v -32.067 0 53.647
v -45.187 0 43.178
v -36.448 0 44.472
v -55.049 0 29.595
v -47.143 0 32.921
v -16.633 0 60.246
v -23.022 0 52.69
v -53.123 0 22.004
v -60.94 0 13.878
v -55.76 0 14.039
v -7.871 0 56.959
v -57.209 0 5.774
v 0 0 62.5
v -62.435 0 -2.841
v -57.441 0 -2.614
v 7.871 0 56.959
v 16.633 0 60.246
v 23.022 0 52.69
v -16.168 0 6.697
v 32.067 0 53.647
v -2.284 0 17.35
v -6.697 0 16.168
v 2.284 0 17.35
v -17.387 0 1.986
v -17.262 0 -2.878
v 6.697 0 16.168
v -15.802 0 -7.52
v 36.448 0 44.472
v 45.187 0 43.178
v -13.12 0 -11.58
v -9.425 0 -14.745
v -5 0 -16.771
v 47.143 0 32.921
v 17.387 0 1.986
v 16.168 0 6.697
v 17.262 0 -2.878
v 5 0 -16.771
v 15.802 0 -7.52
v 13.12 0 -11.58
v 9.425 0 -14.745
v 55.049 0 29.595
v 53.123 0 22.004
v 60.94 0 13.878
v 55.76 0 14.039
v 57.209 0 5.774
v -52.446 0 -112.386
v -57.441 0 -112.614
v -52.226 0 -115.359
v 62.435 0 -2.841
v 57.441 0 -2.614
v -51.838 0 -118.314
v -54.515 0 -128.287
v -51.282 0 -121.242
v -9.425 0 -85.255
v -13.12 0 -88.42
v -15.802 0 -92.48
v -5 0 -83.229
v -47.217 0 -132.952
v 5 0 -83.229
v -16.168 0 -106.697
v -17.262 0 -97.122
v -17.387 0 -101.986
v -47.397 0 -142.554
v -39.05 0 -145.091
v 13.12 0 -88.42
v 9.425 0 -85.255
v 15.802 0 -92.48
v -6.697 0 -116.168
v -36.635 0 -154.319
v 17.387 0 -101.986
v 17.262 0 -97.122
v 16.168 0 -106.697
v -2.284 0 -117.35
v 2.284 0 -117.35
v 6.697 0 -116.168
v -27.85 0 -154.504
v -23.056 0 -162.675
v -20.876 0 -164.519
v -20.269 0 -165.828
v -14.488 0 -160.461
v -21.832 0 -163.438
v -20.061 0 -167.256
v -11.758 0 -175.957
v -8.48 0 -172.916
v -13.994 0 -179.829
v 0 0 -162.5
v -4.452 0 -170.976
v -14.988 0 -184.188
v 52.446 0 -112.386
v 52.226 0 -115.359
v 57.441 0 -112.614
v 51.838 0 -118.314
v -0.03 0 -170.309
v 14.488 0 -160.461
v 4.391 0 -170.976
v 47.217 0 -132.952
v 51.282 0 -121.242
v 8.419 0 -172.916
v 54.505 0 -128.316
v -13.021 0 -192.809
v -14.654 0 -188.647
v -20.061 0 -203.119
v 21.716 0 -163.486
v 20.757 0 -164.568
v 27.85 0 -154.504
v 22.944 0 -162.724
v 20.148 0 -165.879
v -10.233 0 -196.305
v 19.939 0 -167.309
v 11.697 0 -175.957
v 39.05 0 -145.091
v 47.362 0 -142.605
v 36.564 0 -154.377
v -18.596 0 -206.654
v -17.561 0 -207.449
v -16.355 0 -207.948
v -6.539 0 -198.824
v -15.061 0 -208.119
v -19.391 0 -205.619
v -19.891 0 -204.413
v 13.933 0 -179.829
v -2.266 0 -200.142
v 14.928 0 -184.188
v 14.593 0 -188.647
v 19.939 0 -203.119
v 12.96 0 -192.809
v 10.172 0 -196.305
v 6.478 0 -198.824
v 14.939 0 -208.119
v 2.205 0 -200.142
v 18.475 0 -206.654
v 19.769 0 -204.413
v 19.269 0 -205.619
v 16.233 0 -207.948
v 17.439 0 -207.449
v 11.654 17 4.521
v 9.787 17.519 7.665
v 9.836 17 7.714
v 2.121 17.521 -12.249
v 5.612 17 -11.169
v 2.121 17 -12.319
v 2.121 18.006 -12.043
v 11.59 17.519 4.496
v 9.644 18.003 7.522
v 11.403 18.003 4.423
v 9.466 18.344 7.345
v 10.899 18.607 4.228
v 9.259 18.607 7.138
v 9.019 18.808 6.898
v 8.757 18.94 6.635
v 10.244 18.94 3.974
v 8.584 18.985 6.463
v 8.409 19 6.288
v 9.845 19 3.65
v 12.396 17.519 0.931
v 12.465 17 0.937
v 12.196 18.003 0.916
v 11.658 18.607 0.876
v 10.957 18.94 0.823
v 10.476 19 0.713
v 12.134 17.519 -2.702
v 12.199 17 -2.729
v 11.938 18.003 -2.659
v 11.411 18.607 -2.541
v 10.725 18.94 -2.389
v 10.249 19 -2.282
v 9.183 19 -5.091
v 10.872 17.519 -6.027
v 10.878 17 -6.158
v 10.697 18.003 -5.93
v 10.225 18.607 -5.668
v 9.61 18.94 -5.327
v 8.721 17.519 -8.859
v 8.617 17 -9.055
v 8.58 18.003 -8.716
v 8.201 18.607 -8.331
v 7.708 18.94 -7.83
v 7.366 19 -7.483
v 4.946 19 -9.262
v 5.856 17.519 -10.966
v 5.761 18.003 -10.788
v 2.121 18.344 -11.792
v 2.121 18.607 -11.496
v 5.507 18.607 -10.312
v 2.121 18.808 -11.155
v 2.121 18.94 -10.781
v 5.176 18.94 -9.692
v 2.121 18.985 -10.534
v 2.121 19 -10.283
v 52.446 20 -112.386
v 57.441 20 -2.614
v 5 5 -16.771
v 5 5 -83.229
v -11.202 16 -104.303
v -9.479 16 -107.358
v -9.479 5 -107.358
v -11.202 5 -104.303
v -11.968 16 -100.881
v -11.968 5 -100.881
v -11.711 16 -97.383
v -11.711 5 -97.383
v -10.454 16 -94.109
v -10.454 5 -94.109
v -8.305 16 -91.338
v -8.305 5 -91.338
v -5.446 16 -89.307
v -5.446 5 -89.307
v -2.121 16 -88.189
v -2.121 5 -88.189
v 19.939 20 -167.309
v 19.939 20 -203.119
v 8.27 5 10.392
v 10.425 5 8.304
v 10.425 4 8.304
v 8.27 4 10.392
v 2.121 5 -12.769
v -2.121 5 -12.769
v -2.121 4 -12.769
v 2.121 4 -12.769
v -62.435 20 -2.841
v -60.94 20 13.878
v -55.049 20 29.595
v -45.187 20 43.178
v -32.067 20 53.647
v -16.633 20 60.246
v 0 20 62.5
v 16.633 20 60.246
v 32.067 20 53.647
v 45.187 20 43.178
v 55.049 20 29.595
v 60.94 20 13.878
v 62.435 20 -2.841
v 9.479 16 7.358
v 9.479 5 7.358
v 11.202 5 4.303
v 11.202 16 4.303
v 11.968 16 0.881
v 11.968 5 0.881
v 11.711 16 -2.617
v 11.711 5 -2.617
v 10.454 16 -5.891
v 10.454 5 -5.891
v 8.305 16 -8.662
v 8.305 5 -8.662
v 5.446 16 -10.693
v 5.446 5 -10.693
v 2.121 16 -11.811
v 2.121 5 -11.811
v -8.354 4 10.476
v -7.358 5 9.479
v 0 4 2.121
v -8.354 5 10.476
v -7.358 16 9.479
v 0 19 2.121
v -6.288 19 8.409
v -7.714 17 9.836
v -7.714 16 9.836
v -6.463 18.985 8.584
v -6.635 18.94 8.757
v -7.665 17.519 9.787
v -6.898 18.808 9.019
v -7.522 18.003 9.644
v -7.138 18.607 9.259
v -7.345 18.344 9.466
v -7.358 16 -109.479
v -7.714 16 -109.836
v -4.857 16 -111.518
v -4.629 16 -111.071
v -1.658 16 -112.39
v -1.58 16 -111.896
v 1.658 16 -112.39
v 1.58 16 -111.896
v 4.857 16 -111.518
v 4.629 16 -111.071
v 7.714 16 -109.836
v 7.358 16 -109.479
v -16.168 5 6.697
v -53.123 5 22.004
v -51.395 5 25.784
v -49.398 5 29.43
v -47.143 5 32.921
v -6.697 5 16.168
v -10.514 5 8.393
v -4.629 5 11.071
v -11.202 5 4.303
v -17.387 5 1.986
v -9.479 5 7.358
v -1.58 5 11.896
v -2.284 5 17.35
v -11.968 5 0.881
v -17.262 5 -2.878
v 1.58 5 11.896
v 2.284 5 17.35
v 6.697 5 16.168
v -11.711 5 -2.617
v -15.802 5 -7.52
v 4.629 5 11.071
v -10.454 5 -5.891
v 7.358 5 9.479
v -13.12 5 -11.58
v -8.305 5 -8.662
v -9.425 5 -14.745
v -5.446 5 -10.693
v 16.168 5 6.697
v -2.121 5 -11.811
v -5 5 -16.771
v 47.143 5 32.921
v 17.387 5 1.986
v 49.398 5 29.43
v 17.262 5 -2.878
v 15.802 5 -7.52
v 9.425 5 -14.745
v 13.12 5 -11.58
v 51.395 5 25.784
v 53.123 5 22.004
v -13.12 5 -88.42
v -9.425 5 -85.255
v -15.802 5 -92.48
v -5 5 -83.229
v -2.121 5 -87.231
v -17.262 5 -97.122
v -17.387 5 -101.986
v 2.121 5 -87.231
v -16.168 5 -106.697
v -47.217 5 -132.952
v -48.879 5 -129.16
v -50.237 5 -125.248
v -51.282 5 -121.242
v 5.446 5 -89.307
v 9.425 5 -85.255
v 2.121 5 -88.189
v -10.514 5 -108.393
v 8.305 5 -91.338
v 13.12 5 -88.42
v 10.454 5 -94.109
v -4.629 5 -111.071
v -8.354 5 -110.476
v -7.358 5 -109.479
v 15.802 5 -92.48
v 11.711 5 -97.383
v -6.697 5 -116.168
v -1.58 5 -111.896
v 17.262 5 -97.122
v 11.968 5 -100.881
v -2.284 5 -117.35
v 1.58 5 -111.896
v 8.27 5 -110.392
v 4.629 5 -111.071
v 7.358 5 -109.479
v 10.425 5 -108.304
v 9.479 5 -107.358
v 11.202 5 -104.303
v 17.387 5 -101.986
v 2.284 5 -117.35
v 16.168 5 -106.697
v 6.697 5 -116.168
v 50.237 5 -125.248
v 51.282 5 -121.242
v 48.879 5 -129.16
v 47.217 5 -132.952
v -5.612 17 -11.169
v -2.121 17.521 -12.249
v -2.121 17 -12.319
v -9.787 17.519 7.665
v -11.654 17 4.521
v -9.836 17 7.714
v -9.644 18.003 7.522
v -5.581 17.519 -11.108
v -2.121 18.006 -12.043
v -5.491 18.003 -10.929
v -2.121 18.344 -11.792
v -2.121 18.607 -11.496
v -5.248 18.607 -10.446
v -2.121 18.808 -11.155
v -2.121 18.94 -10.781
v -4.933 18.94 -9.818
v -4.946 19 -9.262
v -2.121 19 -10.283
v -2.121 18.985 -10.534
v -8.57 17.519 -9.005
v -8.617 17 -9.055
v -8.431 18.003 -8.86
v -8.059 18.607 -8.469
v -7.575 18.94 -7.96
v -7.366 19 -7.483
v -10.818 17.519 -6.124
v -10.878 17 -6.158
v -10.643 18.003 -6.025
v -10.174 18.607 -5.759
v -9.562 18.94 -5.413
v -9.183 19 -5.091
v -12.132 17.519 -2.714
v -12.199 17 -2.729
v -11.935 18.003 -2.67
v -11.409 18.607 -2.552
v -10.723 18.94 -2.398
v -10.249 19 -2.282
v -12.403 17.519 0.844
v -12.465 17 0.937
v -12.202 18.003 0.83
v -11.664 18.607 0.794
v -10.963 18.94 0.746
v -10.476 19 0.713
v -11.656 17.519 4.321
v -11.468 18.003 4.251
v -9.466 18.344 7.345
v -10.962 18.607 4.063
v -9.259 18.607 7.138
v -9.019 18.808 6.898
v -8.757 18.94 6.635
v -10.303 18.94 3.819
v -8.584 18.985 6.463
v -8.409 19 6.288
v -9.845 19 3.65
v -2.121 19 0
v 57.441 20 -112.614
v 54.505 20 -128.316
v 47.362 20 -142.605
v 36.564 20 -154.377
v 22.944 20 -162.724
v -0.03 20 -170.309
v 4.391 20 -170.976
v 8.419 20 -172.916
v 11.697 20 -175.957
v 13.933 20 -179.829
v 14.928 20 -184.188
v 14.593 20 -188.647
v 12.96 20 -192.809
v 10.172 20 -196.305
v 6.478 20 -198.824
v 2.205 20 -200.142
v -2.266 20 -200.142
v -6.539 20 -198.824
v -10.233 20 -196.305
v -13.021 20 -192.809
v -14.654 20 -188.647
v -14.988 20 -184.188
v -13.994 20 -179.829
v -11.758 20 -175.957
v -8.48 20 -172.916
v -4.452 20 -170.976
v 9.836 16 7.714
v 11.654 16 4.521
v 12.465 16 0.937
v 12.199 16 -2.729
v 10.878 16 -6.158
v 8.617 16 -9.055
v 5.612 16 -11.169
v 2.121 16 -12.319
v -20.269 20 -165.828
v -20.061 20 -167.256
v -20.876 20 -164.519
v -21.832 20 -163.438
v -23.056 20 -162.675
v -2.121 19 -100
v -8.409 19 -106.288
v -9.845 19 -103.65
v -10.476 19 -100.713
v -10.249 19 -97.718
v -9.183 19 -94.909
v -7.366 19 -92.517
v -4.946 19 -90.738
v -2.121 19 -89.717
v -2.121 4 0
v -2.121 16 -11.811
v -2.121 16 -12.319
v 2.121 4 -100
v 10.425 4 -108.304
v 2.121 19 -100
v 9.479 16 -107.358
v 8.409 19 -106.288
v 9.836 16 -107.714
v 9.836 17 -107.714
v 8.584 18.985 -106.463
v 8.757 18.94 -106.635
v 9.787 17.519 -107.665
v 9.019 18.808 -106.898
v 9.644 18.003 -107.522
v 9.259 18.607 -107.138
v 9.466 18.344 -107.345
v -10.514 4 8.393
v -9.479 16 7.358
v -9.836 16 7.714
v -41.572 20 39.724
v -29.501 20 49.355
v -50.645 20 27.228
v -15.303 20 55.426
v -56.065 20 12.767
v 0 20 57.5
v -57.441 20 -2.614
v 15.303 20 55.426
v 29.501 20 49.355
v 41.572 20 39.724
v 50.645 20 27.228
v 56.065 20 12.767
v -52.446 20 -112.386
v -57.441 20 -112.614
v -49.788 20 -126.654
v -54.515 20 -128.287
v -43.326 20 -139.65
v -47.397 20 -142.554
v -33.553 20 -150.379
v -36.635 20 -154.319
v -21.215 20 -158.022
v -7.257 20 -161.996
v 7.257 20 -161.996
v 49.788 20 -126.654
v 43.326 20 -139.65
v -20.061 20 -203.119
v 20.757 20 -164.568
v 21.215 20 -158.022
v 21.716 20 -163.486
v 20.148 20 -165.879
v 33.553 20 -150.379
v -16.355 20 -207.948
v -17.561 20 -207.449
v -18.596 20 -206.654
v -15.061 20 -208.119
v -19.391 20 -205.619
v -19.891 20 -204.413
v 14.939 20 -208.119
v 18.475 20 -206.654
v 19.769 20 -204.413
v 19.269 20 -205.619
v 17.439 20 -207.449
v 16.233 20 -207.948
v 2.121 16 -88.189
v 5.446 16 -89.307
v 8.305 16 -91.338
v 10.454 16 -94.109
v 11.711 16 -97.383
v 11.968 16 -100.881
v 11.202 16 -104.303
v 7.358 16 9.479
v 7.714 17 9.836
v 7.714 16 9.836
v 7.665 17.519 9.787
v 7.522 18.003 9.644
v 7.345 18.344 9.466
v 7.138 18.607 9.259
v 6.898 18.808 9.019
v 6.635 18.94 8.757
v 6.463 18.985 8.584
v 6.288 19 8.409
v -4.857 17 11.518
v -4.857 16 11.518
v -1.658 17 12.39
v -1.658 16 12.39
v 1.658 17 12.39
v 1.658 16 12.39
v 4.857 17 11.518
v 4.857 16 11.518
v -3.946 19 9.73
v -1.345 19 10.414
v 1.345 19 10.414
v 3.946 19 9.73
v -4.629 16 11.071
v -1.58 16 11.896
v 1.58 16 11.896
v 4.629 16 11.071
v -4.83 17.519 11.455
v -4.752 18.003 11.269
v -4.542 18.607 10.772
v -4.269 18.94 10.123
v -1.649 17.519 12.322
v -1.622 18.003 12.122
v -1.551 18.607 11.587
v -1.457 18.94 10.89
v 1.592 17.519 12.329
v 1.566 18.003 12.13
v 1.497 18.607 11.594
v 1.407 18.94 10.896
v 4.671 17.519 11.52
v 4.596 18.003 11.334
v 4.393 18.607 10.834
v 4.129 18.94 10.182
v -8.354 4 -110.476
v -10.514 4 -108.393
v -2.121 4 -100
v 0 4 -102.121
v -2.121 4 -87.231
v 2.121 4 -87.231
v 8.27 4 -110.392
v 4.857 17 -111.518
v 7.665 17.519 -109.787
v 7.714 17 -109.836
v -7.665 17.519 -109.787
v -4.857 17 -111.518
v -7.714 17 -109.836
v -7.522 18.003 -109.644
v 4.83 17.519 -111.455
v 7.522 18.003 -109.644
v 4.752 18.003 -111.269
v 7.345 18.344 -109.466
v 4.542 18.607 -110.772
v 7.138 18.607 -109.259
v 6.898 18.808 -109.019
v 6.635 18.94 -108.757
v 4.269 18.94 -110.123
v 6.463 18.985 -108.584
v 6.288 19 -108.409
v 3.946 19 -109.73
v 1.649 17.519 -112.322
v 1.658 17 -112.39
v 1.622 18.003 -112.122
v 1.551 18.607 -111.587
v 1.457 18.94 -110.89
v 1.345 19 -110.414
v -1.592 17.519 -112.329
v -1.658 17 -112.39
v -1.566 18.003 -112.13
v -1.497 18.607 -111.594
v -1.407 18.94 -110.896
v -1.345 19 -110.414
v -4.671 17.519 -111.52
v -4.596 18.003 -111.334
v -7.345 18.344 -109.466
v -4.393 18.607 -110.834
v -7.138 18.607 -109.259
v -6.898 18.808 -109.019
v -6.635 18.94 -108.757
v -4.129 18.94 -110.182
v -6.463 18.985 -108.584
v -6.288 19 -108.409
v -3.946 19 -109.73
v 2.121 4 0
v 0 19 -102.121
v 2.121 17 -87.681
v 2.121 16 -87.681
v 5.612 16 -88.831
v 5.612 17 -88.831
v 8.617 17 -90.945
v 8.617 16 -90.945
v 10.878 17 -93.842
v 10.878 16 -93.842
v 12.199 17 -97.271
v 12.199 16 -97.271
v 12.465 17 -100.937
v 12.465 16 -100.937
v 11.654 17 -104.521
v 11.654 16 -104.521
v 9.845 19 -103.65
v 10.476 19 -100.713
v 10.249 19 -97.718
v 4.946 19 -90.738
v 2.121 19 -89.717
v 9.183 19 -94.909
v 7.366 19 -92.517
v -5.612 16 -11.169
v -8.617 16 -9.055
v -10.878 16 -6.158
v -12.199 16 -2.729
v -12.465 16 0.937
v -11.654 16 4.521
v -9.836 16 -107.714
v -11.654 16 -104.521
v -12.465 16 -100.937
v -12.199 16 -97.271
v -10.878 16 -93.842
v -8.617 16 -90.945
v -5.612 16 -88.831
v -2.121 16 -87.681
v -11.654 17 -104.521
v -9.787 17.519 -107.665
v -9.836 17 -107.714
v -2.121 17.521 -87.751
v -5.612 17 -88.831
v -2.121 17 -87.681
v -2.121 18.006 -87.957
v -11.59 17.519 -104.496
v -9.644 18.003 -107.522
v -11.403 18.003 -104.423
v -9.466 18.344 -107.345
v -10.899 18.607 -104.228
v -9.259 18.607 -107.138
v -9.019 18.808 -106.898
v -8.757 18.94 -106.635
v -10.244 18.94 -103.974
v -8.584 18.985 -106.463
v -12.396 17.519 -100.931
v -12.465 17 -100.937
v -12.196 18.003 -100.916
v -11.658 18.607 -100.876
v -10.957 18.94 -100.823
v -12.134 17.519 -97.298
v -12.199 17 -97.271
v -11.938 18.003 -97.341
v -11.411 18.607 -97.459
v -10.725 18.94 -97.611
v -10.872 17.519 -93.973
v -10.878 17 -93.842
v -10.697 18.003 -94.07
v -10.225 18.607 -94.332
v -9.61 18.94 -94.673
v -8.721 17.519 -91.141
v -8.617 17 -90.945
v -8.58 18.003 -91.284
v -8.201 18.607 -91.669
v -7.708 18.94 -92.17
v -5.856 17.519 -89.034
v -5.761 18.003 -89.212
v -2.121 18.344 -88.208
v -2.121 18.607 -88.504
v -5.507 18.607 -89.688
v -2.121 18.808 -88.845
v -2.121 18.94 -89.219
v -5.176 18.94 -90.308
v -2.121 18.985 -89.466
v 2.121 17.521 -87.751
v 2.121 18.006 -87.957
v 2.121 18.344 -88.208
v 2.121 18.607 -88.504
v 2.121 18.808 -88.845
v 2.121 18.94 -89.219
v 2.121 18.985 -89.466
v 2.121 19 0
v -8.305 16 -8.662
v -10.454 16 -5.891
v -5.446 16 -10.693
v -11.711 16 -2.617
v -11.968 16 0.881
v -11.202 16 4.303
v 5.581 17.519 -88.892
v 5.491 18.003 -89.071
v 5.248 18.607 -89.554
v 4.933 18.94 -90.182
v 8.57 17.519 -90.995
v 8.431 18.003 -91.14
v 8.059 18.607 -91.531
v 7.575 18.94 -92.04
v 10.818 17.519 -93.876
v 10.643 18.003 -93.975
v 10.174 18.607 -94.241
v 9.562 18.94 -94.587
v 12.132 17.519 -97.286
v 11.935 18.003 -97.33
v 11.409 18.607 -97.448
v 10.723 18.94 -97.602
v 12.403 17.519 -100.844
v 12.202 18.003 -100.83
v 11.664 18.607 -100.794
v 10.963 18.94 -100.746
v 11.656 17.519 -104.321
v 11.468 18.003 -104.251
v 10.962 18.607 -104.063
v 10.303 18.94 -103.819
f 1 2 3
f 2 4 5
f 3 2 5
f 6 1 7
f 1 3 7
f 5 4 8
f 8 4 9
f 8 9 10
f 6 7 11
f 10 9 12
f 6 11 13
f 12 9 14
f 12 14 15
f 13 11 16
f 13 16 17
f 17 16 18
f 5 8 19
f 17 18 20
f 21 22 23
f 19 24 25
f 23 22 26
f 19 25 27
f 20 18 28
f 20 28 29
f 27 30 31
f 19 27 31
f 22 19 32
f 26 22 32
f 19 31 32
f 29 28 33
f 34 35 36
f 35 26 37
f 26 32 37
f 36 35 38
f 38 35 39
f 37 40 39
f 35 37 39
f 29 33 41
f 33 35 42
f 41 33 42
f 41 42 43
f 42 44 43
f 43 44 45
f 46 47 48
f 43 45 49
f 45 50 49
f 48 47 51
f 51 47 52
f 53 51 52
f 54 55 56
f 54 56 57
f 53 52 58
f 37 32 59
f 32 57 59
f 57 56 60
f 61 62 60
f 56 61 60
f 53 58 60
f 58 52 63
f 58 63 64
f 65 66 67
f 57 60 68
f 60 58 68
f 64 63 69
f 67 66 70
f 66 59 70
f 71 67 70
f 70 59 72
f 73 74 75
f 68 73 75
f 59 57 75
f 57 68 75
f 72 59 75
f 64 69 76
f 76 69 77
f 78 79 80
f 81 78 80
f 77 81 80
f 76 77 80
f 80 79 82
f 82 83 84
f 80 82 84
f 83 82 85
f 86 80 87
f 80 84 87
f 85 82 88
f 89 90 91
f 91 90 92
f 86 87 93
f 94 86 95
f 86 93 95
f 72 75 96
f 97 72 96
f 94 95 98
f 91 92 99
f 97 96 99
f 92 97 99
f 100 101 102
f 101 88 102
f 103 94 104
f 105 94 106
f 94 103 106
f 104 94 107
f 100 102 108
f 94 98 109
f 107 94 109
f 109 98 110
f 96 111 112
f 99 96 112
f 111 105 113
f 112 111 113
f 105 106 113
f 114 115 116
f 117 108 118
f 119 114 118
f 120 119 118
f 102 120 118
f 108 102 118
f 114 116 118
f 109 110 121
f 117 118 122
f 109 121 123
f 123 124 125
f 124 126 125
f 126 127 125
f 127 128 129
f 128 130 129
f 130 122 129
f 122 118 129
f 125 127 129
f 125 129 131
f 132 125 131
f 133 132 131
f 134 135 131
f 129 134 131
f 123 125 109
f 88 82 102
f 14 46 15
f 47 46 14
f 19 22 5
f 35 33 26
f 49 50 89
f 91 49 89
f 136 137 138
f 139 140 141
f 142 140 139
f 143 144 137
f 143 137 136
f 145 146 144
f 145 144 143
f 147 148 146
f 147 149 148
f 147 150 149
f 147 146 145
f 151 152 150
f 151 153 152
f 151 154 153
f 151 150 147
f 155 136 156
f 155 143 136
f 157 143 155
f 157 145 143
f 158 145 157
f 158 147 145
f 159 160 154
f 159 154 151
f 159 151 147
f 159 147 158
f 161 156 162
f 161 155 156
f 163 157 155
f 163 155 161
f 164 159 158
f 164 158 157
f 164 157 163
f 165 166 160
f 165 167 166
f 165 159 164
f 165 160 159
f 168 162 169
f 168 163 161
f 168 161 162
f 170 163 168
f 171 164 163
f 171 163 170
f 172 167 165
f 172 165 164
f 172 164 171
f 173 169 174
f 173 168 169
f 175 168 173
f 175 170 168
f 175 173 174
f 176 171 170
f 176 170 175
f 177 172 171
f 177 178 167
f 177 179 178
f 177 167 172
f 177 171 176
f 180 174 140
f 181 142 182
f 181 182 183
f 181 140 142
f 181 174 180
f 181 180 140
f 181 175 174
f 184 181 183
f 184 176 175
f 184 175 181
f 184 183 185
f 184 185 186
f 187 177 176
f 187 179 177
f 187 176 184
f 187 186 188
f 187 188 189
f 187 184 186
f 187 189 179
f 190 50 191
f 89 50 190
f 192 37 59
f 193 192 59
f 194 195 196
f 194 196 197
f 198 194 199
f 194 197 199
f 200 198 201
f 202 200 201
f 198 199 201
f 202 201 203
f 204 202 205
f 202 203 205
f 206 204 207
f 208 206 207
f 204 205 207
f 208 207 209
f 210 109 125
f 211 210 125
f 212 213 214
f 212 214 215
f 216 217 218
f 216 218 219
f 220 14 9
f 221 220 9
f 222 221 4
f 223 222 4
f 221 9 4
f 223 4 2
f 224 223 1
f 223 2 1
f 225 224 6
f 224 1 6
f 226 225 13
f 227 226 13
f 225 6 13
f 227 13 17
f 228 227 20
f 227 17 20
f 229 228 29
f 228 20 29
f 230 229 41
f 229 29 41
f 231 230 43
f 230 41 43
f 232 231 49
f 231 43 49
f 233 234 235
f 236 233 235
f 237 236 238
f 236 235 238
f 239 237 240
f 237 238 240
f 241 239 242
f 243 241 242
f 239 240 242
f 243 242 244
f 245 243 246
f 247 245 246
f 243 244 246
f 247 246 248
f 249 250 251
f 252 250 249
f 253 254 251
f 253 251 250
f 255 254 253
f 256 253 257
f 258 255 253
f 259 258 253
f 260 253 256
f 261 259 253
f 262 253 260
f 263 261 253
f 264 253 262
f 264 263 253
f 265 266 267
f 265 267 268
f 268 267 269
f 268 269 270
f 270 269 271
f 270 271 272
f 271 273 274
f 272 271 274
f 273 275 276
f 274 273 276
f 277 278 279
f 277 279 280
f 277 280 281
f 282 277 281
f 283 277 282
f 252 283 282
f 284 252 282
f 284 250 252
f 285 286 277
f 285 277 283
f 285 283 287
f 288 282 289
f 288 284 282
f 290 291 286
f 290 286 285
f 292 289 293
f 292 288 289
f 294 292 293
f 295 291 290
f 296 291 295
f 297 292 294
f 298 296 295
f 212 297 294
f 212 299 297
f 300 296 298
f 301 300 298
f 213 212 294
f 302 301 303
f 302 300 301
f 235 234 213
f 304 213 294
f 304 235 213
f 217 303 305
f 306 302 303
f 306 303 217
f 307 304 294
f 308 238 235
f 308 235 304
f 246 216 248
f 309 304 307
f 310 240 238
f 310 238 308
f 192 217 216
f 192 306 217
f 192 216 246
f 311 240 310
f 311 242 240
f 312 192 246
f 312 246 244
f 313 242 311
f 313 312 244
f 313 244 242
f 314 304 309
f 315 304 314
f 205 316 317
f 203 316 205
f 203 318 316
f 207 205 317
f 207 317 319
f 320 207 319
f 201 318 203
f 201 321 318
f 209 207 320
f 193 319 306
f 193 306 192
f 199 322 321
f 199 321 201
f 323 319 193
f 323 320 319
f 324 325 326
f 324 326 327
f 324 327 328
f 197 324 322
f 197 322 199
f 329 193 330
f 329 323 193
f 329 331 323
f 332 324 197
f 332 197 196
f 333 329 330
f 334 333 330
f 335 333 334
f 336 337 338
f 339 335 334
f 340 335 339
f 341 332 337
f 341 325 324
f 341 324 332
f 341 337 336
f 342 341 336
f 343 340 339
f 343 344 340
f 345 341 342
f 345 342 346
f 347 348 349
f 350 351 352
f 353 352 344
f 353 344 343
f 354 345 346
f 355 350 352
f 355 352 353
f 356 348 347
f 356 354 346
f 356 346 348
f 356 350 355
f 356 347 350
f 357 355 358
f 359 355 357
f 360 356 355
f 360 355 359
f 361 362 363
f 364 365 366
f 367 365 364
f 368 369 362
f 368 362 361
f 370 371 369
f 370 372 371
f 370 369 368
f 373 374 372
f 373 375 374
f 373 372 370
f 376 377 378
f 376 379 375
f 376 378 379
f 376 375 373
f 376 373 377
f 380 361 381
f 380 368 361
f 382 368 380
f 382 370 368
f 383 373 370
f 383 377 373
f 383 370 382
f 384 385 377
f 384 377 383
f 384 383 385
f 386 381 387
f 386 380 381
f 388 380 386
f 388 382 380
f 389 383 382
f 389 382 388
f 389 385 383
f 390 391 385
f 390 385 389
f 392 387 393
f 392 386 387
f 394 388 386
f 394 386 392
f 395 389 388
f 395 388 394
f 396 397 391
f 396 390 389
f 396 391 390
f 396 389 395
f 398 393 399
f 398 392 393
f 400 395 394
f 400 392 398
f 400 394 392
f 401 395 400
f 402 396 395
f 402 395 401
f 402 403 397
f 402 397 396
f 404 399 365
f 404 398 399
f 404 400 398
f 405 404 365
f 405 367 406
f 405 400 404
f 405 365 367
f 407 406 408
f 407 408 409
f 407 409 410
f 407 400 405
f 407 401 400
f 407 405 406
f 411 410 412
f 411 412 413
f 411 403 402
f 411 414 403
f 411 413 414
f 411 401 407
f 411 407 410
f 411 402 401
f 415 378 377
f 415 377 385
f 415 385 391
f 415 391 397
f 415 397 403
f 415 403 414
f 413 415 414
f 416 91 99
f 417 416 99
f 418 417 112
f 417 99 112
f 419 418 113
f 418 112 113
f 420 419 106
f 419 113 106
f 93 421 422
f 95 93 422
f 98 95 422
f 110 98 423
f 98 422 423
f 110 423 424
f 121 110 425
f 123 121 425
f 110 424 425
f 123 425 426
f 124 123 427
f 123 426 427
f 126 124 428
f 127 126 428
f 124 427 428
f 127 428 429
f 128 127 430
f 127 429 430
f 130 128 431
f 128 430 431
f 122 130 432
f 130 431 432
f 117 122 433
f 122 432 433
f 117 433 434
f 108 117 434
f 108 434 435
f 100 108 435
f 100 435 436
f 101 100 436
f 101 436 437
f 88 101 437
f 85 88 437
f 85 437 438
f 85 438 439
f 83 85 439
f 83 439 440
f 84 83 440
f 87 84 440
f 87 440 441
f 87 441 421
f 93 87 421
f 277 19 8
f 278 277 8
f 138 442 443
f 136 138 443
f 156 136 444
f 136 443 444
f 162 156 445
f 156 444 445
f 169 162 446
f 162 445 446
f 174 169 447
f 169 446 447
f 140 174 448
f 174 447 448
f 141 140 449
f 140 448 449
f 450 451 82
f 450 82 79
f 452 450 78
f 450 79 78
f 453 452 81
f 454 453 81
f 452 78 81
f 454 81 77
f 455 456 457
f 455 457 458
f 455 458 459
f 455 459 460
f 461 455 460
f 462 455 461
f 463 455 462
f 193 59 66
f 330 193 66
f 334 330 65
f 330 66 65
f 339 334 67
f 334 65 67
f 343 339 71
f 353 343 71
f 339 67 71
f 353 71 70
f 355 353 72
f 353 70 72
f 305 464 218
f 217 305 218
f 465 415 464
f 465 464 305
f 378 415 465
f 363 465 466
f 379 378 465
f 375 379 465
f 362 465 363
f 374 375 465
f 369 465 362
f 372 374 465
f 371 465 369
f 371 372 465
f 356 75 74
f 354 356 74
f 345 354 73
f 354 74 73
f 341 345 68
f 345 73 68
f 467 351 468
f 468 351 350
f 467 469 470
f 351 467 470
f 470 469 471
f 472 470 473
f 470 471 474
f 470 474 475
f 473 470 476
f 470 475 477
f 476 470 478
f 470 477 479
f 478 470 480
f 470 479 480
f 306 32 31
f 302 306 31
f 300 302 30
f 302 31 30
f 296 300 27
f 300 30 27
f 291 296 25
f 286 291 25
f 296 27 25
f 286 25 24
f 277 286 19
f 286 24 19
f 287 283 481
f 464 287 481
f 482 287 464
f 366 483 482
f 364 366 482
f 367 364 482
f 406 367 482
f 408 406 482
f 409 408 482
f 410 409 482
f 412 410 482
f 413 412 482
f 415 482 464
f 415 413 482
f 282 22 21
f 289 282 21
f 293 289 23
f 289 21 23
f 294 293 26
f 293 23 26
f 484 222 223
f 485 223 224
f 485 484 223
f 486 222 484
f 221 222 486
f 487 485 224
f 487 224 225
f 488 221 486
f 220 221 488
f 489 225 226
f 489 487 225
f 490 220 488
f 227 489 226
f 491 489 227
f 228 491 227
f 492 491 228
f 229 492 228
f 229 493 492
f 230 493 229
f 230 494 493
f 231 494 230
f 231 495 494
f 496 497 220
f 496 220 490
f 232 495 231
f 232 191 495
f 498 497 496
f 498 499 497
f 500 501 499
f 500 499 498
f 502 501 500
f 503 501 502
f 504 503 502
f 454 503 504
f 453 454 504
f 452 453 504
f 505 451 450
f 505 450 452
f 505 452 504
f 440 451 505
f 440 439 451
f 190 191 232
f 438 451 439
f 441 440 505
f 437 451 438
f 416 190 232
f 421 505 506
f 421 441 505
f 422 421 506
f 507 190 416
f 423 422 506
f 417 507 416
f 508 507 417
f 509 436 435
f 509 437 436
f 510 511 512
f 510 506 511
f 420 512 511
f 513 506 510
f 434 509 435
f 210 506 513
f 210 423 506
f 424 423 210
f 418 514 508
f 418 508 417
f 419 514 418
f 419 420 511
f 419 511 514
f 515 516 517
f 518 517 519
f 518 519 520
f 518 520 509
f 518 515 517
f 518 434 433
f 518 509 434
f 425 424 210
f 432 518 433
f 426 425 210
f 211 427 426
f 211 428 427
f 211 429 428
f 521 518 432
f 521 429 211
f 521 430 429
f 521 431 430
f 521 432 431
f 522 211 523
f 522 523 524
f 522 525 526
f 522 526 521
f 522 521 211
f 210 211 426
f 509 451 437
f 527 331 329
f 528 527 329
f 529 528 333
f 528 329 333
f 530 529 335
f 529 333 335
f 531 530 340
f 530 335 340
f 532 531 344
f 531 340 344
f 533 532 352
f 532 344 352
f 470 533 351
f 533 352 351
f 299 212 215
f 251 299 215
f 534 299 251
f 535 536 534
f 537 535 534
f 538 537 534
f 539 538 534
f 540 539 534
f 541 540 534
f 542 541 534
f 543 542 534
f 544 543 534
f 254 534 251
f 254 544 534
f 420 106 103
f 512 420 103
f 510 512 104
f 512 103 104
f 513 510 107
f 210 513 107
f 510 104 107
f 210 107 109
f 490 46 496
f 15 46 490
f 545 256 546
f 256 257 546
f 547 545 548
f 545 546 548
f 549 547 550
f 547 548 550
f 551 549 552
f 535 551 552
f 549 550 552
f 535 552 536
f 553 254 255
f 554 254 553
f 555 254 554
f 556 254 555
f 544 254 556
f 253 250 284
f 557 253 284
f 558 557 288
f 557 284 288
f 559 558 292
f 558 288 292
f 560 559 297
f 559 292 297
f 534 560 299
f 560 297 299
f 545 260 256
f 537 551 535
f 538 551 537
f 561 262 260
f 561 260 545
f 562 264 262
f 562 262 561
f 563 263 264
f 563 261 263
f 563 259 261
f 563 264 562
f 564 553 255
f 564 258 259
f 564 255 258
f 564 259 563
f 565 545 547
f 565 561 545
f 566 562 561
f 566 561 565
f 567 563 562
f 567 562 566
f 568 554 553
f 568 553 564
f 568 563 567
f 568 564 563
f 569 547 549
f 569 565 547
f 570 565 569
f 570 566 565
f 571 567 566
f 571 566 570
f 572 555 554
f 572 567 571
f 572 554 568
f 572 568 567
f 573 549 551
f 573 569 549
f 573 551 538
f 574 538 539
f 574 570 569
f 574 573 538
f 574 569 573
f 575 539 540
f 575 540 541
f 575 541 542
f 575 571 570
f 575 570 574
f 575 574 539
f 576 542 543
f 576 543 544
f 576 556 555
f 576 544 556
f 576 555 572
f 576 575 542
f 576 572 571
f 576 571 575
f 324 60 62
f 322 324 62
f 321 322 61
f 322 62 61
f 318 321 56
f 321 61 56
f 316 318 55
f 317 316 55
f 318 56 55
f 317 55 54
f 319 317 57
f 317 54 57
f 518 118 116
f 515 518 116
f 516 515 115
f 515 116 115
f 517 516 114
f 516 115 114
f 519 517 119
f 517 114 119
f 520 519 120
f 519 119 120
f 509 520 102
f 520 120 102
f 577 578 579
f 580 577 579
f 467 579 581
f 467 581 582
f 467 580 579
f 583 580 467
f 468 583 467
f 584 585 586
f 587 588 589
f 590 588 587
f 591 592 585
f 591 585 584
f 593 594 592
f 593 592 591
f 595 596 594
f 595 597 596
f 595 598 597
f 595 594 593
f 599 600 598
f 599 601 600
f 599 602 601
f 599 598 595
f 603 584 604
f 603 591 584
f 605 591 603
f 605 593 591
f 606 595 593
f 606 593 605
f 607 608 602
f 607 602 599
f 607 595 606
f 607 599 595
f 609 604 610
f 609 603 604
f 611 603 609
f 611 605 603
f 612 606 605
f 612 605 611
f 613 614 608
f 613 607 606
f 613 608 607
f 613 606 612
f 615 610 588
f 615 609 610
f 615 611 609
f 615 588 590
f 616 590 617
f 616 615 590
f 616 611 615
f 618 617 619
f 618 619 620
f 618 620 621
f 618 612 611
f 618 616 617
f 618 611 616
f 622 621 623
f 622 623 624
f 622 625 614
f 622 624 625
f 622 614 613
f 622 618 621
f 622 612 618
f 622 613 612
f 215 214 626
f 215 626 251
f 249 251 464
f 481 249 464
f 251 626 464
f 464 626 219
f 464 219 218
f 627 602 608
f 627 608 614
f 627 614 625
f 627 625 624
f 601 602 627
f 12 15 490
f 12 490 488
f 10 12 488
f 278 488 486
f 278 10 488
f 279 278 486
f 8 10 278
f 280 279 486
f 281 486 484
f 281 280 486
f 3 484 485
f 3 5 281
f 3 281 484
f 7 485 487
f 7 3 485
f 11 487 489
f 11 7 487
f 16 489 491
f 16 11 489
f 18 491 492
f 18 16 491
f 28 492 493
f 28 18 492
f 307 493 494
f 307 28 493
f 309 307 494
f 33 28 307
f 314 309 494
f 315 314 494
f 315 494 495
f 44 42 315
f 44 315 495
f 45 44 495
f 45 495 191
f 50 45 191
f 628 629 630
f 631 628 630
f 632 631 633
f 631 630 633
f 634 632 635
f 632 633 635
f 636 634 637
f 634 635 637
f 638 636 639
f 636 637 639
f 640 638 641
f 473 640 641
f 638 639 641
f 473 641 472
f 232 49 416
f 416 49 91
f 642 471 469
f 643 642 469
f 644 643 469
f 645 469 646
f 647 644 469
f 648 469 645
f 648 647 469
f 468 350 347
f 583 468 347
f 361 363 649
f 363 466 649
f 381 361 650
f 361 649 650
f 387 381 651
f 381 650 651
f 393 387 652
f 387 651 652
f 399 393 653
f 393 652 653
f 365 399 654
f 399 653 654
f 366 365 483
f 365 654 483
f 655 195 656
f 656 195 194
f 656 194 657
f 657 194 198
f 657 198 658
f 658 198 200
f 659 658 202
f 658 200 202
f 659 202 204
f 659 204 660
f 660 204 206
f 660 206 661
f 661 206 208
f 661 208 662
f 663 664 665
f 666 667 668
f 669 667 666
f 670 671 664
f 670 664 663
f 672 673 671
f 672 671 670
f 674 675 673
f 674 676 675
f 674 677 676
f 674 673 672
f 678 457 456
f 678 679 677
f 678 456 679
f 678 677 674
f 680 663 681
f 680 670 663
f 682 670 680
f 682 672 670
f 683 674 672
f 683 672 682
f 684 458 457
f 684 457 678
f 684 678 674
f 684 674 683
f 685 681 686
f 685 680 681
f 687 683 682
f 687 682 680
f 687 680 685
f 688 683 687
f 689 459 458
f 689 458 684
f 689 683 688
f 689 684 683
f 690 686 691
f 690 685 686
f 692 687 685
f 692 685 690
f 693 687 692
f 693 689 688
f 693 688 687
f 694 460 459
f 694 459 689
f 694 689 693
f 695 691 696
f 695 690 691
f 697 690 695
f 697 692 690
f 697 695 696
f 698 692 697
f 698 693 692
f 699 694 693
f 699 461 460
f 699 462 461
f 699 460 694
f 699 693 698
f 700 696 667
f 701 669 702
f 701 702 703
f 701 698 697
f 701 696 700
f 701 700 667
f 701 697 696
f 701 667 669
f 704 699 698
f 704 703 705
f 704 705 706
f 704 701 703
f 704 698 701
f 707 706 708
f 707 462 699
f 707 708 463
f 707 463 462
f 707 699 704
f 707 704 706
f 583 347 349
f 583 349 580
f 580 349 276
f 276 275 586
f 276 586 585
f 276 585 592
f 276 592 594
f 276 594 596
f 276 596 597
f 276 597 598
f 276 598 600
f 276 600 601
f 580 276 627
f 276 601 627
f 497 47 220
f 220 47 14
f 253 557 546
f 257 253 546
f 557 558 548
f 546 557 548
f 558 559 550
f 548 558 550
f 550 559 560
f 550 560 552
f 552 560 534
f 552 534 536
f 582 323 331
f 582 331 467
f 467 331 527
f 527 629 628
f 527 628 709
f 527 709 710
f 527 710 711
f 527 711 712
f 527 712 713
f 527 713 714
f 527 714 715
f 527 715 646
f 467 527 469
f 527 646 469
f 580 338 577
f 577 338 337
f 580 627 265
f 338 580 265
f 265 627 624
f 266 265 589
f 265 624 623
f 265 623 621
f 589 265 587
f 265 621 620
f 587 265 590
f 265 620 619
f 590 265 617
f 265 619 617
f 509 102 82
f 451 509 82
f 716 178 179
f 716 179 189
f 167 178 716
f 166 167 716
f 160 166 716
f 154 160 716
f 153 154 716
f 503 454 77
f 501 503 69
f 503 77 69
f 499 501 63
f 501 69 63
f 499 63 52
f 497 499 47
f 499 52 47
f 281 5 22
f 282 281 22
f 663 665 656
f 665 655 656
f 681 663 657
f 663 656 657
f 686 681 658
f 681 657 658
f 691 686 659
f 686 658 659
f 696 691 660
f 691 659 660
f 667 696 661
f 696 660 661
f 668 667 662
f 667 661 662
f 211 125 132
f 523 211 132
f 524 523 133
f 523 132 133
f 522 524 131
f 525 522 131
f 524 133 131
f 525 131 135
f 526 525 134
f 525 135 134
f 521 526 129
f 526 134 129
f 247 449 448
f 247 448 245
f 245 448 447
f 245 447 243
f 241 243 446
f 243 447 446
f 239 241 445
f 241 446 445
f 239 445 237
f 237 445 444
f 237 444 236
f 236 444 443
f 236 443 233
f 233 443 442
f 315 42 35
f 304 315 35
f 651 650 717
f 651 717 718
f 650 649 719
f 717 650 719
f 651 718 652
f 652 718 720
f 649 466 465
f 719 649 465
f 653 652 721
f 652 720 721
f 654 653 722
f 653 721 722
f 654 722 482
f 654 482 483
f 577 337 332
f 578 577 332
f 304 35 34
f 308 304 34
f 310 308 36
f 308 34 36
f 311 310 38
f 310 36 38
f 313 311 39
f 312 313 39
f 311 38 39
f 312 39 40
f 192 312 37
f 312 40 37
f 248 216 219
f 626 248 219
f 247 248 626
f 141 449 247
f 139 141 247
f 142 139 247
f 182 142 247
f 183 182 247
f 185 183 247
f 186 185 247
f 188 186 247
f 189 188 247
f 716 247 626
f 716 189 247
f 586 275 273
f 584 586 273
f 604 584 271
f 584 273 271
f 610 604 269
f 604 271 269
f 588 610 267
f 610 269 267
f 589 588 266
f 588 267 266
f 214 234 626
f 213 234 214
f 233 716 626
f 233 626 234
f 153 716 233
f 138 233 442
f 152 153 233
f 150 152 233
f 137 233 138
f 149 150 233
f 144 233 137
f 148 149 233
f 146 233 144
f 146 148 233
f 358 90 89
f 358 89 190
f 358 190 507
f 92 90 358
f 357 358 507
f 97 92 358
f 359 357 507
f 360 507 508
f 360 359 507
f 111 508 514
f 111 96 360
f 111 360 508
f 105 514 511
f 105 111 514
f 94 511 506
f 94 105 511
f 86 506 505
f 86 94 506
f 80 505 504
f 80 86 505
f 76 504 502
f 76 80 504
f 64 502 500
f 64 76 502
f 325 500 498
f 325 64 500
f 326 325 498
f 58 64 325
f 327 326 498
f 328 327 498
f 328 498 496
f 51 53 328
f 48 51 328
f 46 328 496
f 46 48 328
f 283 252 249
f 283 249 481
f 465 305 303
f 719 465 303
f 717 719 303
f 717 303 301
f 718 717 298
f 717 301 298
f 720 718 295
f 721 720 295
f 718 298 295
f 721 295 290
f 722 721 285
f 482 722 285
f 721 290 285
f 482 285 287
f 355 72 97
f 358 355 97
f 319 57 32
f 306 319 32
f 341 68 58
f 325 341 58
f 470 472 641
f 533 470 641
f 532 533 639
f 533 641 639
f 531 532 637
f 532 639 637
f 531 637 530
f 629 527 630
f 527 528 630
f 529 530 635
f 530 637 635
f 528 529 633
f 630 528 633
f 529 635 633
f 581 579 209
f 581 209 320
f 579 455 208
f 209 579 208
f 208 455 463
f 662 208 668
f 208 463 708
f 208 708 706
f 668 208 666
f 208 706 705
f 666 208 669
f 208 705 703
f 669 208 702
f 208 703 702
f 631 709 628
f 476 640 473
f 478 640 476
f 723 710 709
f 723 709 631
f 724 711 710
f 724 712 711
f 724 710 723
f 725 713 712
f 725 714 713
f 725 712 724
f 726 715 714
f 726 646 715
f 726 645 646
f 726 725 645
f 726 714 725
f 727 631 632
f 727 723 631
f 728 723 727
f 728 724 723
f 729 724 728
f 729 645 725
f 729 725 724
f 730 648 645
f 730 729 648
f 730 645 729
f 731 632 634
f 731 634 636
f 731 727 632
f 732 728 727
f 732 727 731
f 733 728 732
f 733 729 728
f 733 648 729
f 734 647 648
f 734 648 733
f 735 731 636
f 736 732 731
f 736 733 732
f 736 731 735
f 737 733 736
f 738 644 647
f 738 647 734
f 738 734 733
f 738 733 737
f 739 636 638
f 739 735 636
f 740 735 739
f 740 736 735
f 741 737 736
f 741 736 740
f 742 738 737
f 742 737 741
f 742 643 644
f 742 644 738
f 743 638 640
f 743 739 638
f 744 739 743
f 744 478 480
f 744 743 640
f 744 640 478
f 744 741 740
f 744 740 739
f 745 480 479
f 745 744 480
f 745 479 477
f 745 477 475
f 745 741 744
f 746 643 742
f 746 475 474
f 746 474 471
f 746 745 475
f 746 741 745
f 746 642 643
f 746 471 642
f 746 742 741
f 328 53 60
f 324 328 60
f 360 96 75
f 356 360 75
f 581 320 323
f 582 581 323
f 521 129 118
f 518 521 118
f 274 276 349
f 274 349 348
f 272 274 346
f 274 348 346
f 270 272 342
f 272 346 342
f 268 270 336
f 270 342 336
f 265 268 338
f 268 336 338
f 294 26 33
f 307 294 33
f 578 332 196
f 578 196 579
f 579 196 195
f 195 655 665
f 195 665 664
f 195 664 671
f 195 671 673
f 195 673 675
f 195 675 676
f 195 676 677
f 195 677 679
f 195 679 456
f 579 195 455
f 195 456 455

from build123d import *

# Parameters (mm, degrees)
SALIENTE_EXTRUIR1_DEPTH = 20
SALIENTE_EXTRUIR2_DEPTH = 5
SKETCH1_R               = 12
BOSS_EXTRUDE1_DEPTH     = 11
SKETCH2_R               = 12.5
BOSS_EXTRUDE2_DEPTH     = 3
FILLET1_R               = 2
CUT_EXTRUDE2_DEPTH      = 15
SKETCH7_R               = 15
CUT_EXTRUDE3_DEPTH      = 28


with BuildPart() as part:
    # Croquis1 → Saliente-Extruir1 (new body)
    with BuildSketch(Plane(origin=(0, 0, 0), x_dir=(1, 0, 0), z_dir=(0, 1, 0))):
        with BuildLine():
            Line((-57.44056846, 112.613636364), (-62.4354005, 2.840909091))
            ThreePointArc((-62.4354005, 2.840909091), (0, -62.5), (62.4354005, 2.840909091))
            Line((62.4354005, 2.840909091), (57.44056846, 112.613636364))
            ThreePointArc((57.44056846, 112.613636364), (47.362244362, 142.604720655), (22.943989921, 162.724029877))
            ThreePointArc((22.943989921, 162.724029877), (20.757274923, 164.567893199), (19.93911948, 167.308728127))
            Line((19.93911948, 167.308728127), (19.93911948, 203.118676651))
            ThreePointArc((19.93911948, 203.118676651), (18.474653385, 206.654210557), (14.93911948, 208.118676651))
            Line((14.93911948, 208.118676651), (-15.06088052, 208.118676651))
            ThreePointArc((-15.06088052, 208.118676651), (-18.596414426, 206.654210557), (-20.06088052, 203.118676651))
            Line((-20.06088052, 203.118676651), (-20.06088052, 167.255587217))
            ThreePointArc((-20.06088052, 167.255587217), (-20.876125318, 164.519198375), (-23.056010079, 162.675140239))
            ThreePointArc((-23.056010079, 162.675140239), (-47.396870484, 142.554364812), (-57.44056846, 112.613636364))
        make_face()
        with BuildLine():
            Line((-52.44573642, 112.386363636), (-57.44056846, 2.613636364))
            ThreePointArc((-57.44056846, 2.613636364), (0, -57.5), (57.44056846, 2.613636364))
            Line((57.44056846, 2.613636364), (52.44573642, 112.386363636))
            ThreePointArc((52.44573642, 112.386363636), (0, 162.5), (-52.44573642, 112.386363636))
        make_face(mode=Mode.SUBTRACT)
    extrude(amount=SALIENTE_EXTRUIR1_DEPTH)



with BuildPart() as body_2:
    # Croquis2 → Saliente-Extruir2 (new body)
    with BuildSketch(Plane(origin=(0, 0, 0), x_dir=(-1, 0, 0), z_dir=(0, -1, 0))):
        with BuildLine():
            Line((5, 83.229490169), (5, 16.770509831))
            ThreePointArc((5, 16.770509831), (15.80191276, 7.519943692), (16.167891819, -6.696960066))
            Line((16.167891819, -6.696960066), (53.123073119, -22.004297361))
            ThreePointArc((53.123073119, -22.004297361), (50.429243253, -27.625014479), (47.142858448, -32.921131471))
            Line((47.142858448, -32.921131471), (6.696960066, -16.167891819))
            ThreePointArc((6.696960066, -16.167891819), (0, -17.5), (-6.696960066, -16.167891819))
            Line((-6.696960066, -16.167891819), (-47.142858448, -32.921131471))
            ThreePointArc((-47.142858448, -32.921131471), (-50.429243253, -27.625014479), (-53.123073119, -22.004297361))
            Line((-53.123073119, -22.004297361), (-16.167891819, -6.696960066))
            ThreePointArc((-16.167891819, -6.696960066), (-15.80191276, 7.519943692), (-5, 16.770509831))
            Line((-5, 16.770509831), (-5, 83.229490169))
            ThreePointArc((-5, 83.229490169), (-15.80191276, 92.480056308), (-16.167891819, 106.696960066))
            Line((-16.167891819, 106.696960066), (-51.282274043, 121.241813418))
            ThreePointArc((-51.282274043, 121.241813418), (-49.596532898, 127.217256589), (-47.217157465, 132.951907131))
            Line((-47.217157465, 132.951907131), (-6.696960066, 116.167891819))
            ThreePointArc((-6.696960066, 116.167891819), (0, 117.5), (6.696960066, 116.167891819))
            Line((6.696960066, 116.167891819), (47.217157465, 132.951907131))
            ThreePointArc((47.217157465, 132.951907131), (49.596532898, 127.217256589), (51.282274043, 121.241813418))
            Line((51.282274043, 121.241813418), (16.167891819, 106.696960066))
            ThreePointArc((16.167891819, 106.696960066), (15.80191276, 92.480056308), (5, 83.229490169))
        make_face()
    extrude(amount=-SALIENTE_EXTRUIR2_DEPTH)


with BuildPart() as part_1:
    add(part.part)

    add(body_2.part)  # Boss-Extrude1 merges body 2
    # Sketch1 → Boss-Extrude1 (add)
    with BuildSketch(Plane(origin=(0, 5, 0), x_dir=(1, 0, 0), z_dir=(0, 1, 0))):
        with Locations(Location((0, 100, 0), (0, 0, 90))):
            Circle(SKETCH1_R)
        with Locations(Location((0, 0, 0), (0, 0, 90))):
            Circle(SKETCH1_R)
    extrude(amount=BOSS_EXTRUDE1_DEPTH)

    # Sketch2 → Boss-Extrude2 (add)
    with BuildSketch(Plane(origin=(0, 16, 0), x_dir=(1, 0, 0), z_dir=(0, 1, 0))):
        with Locations(Location((0, 100, 0), (0, 0, 270))):
            Circle(SKETCH2_R)
        with Locations(Location((0, 0, 0), (0, 0, 270))):
            Circle(SKETCH2_R)
    extrude(amount=BOSS_EXTRUDE2_DEPTH)

    # Fillet1
    fillet1_edges = [part_1.edges().sort_by_distance(p)[0] for p in [
        (0, 19, -112.5),
        (0, 19, -12.5),
    ]]
    fillet(fillet1_edges, radius=FILLET1_R)

    # Sketch6 → Cut-Extrude2 (cut)
    with BuildSketch(Plane(origin=(0, 19, 0), x_dir=(1, 0, 0), z_dir=(0, 1, 0))):
        Polygon((-10.514481664, 108.393161321), (-2.121320344, 100), (-2.121320344, 87.230677616), (2.121320344, 87.230677616), (2.121320344, 100), (10.425393612, 108.304073268), (8.270497601, 110.391817945), (0, 102.121320344), (-8.354488758, 110.475809101), align=None)
        Polygon((-2.121320344, 12.769322384), (2.121320344, 12.769322384), (2.121320344, 0), (10.425393612, -8.304073268), (8.270497601, -10.391817945), (0, -2.121320344), (-8.354488758, -10.475809101), (-10.514481664, -8.393161321), (-2.121320344, 0), align=None)
    extrude(amount=-CUT_EXTRUDE2_DEPTH, mode=Mode.SUBTRACT)

    # Sketch7 → Cut-Extrude3 (cut)
    with BuildSketch(Plane(origin=(0, 20, 0), x_dir=(1, 0, 0), z_dir=(0, 1, 0))):
        with Locations(Location((-0.03044026, 185.309338326, 0), (0, 0, 270))):
            Circle(SKETCH7_R)
    extrude(amount=-CUT_EXTRUDE3_DEPTH, mode=Mode.SUBTRACT)


solid = part_1.part
